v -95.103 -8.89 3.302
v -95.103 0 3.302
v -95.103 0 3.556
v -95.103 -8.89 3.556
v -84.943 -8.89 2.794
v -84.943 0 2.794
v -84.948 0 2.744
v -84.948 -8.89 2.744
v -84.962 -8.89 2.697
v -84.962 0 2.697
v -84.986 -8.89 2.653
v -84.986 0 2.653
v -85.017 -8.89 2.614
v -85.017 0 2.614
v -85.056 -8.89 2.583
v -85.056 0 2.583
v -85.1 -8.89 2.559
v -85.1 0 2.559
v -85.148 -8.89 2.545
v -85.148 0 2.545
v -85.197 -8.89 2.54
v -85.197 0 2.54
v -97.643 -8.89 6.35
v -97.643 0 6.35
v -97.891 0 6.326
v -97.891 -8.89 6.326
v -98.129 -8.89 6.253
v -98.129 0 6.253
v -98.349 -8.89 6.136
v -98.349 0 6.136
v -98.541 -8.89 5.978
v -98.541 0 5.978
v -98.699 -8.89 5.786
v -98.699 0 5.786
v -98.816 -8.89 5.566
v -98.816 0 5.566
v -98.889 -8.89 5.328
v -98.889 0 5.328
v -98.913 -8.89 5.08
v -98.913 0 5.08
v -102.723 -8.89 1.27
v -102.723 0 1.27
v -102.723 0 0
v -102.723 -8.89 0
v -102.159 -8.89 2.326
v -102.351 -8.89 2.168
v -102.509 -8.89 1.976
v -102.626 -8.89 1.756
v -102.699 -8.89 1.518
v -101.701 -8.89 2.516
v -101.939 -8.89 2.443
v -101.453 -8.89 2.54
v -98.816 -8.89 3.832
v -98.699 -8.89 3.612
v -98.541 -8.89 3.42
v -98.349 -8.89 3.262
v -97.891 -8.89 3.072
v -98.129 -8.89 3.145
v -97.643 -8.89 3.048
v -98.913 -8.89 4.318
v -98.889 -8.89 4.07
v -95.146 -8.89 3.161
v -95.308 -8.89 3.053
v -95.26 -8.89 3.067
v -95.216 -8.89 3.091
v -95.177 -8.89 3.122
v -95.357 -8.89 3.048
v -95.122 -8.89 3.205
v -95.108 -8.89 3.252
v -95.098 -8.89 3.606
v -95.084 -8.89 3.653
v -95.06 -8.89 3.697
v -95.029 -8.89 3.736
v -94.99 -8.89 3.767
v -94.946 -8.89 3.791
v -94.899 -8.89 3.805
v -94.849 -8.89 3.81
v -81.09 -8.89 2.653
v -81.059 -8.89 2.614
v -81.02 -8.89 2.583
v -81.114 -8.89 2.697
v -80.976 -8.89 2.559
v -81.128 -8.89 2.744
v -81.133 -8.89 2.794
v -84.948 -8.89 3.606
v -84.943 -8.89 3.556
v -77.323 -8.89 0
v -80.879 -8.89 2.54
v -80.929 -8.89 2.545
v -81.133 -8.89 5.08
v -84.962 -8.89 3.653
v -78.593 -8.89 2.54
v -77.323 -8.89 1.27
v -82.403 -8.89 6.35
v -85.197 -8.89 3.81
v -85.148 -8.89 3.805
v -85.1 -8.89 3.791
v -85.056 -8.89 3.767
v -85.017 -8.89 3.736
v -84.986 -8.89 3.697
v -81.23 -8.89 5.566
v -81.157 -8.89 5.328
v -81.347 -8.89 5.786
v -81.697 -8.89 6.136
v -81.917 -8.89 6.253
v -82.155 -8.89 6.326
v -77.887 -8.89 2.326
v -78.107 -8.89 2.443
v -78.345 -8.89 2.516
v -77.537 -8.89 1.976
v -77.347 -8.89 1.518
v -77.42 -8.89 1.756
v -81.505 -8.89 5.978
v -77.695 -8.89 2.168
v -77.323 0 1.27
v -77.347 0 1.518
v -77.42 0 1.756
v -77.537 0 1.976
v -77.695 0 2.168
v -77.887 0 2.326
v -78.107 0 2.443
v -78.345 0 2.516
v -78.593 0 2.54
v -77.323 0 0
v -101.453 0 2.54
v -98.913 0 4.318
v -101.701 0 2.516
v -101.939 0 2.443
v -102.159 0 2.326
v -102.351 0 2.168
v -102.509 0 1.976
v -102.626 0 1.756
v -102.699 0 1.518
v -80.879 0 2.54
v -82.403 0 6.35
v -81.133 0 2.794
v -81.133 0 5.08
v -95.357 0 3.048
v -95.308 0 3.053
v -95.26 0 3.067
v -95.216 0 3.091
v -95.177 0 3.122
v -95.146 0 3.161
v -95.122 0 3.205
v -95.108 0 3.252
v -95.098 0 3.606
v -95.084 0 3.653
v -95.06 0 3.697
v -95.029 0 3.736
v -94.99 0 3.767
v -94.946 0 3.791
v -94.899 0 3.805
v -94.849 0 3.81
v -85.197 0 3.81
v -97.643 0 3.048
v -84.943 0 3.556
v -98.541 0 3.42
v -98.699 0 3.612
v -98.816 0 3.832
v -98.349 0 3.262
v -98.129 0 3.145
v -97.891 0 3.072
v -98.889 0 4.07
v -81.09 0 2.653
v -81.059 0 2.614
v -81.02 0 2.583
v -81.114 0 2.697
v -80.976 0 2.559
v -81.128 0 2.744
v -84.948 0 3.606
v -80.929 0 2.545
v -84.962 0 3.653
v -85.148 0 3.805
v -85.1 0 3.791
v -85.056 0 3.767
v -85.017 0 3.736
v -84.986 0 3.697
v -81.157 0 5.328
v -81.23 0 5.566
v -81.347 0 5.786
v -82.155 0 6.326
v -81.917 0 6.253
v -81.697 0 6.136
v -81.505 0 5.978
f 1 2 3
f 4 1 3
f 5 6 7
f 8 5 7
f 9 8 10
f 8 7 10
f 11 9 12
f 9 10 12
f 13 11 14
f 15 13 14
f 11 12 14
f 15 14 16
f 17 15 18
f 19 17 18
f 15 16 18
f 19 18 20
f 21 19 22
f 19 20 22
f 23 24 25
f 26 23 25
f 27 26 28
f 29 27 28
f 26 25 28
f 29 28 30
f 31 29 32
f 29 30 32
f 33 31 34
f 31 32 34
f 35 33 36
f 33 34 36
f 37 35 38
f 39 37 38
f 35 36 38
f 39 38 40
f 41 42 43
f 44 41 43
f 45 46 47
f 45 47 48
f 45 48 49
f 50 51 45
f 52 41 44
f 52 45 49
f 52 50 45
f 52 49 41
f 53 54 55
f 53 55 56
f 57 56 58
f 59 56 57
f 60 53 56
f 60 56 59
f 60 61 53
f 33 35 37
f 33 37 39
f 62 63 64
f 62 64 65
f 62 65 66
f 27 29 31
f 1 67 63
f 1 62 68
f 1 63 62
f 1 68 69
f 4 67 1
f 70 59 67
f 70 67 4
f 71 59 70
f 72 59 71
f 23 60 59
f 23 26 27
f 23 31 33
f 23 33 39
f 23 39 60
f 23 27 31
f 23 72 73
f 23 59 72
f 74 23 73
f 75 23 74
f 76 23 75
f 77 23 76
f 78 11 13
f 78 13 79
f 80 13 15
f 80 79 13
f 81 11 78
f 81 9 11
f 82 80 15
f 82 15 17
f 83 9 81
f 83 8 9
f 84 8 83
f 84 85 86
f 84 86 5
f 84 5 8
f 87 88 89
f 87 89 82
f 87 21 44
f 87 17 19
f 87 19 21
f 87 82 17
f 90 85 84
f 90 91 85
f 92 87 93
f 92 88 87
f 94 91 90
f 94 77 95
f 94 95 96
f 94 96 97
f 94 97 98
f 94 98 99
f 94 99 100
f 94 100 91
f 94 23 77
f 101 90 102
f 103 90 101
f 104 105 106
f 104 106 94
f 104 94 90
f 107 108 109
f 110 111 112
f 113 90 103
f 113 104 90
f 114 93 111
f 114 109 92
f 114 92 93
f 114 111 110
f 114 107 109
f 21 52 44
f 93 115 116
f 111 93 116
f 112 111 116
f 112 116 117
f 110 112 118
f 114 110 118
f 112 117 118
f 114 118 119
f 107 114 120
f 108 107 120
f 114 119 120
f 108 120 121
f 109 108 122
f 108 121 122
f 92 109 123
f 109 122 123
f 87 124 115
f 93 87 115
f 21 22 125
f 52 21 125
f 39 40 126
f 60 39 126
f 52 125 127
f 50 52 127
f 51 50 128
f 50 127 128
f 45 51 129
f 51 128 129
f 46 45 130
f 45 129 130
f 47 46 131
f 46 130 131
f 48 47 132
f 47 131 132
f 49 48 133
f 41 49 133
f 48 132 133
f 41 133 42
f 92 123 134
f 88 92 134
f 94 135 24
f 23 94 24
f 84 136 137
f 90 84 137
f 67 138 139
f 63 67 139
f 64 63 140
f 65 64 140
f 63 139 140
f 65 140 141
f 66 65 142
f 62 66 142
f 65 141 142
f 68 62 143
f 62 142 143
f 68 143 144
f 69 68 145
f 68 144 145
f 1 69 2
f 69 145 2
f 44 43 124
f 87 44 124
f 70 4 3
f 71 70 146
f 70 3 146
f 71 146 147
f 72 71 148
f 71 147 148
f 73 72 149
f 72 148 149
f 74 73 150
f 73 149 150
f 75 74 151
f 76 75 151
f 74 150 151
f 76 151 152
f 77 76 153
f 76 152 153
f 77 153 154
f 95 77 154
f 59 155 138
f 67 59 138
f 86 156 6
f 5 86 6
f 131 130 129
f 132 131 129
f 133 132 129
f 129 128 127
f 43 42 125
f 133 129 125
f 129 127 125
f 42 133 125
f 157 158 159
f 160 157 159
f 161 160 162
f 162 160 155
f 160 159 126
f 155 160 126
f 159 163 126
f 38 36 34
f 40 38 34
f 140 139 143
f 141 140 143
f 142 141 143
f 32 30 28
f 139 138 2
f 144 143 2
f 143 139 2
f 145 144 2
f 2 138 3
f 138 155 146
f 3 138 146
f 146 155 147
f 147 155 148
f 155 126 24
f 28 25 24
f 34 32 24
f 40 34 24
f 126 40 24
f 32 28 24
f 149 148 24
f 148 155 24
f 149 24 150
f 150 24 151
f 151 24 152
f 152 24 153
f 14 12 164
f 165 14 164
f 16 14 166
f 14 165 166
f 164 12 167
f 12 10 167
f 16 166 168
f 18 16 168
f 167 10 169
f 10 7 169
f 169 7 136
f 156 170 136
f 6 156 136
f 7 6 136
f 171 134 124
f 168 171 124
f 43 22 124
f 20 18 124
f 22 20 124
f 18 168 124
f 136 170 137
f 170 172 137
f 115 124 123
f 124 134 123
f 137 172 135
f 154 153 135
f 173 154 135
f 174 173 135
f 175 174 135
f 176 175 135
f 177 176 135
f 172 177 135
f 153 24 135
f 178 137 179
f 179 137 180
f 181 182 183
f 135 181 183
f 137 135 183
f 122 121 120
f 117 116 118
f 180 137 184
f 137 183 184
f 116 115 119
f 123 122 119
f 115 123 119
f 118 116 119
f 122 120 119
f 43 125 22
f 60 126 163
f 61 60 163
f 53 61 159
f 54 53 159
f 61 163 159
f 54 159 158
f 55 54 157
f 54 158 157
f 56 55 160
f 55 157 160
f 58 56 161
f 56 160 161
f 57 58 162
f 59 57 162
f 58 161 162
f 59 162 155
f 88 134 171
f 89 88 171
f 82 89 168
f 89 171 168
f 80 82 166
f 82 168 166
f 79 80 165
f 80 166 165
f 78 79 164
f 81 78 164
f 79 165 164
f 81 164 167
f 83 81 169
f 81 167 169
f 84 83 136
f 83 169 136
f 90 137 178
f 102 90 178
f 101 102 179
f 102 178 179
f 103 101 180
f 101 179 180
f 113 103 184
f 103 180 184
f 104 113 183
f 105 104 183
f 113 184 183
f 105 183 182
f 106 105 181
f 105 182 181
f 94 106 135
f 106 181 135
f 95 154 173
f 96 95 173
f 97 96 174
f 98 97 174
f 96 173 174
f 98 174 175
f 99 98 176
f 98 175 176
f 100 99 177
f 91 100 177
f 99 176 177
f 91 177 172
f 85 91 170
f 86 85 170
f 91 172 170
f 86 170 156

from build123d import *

# Parameters (mm, degrees)
F1_DEPTH = 8.89


with BuildPart() as f1:
    # F0 (on Front) → F1 (new body)
    with BuildSketch(Plane.XZ):
        with BuildLine():
            Line((-102.723063, 1.27), (-102.723063, 0))
            Line((-102.723063, 0), (-77.323063, 0))
            Line((-77.323063, 0), (-77.323063, 1.27))
            ThreePointArc((-77.323063, 1.27), (-77.695037, 2.168026), (-78.593063, 2.54))
            Line((-78.593063, 2.54), (-80.879063, 2.54))
            ThreePointArc((-80.879063, 2.54), (-81.058668, 2.614395), (-81.133063, 2.794))
            Line((-81.133063, 2.794), (-81.133063, 5.08))
            ThreePointArc((-81.133063, 5.08), (-81.505037, 5.978026), (-82.403063, 6.35))
            Line((-82.403063, 6.35), (-97.643063, 6.35))
            ThreePointArc((-97.643063, 6.35), (-98.541089, 5.978026), (-98.913063, 5.08))
            Line((-98.913063, 5.08), (-98.913063, 4.318))
            ThreePointArc((-98.913063, 4.318), (-98.541089, 3.419974), (-97.643063, 3.048))
            Line((-97.643063, 3.048), (-95.357063, 3.048))
            ThreePointArc((-95.357063, 3.048), (-95.177458, 3.122395), (-95.103063, 3.302))
            Line((-95.103063, 3.302), (-95.103063, 3.556))
            ThreePointArc((-95.103063, 3.556), (-95.028668, 3.735605), (-94.849063, 3.81))
            Line((-94.849063, 3.81), (-85.197063, 3.81))
            ThreePointArc((-85.197063, 3.81), (-85.017458, 3.735605), (-84.943063, 3.556))
            Line((-84.943063, 3.556), (-84.943063, 2.794))
            ThreePointArc((-84.943063, 2.794), (-85.017458, 2.614395), (-85.197063, 2.54))
            Line((-85.197063, 2.54), (-101.453063, 2.54))
            ThreePointArc((-101.453063, 2.54), (-102.351089, 2.168026), (-102.723063, 1.27))
        make_face()
    extrude(amount=F1_DEPTH)


solid = f1.part
